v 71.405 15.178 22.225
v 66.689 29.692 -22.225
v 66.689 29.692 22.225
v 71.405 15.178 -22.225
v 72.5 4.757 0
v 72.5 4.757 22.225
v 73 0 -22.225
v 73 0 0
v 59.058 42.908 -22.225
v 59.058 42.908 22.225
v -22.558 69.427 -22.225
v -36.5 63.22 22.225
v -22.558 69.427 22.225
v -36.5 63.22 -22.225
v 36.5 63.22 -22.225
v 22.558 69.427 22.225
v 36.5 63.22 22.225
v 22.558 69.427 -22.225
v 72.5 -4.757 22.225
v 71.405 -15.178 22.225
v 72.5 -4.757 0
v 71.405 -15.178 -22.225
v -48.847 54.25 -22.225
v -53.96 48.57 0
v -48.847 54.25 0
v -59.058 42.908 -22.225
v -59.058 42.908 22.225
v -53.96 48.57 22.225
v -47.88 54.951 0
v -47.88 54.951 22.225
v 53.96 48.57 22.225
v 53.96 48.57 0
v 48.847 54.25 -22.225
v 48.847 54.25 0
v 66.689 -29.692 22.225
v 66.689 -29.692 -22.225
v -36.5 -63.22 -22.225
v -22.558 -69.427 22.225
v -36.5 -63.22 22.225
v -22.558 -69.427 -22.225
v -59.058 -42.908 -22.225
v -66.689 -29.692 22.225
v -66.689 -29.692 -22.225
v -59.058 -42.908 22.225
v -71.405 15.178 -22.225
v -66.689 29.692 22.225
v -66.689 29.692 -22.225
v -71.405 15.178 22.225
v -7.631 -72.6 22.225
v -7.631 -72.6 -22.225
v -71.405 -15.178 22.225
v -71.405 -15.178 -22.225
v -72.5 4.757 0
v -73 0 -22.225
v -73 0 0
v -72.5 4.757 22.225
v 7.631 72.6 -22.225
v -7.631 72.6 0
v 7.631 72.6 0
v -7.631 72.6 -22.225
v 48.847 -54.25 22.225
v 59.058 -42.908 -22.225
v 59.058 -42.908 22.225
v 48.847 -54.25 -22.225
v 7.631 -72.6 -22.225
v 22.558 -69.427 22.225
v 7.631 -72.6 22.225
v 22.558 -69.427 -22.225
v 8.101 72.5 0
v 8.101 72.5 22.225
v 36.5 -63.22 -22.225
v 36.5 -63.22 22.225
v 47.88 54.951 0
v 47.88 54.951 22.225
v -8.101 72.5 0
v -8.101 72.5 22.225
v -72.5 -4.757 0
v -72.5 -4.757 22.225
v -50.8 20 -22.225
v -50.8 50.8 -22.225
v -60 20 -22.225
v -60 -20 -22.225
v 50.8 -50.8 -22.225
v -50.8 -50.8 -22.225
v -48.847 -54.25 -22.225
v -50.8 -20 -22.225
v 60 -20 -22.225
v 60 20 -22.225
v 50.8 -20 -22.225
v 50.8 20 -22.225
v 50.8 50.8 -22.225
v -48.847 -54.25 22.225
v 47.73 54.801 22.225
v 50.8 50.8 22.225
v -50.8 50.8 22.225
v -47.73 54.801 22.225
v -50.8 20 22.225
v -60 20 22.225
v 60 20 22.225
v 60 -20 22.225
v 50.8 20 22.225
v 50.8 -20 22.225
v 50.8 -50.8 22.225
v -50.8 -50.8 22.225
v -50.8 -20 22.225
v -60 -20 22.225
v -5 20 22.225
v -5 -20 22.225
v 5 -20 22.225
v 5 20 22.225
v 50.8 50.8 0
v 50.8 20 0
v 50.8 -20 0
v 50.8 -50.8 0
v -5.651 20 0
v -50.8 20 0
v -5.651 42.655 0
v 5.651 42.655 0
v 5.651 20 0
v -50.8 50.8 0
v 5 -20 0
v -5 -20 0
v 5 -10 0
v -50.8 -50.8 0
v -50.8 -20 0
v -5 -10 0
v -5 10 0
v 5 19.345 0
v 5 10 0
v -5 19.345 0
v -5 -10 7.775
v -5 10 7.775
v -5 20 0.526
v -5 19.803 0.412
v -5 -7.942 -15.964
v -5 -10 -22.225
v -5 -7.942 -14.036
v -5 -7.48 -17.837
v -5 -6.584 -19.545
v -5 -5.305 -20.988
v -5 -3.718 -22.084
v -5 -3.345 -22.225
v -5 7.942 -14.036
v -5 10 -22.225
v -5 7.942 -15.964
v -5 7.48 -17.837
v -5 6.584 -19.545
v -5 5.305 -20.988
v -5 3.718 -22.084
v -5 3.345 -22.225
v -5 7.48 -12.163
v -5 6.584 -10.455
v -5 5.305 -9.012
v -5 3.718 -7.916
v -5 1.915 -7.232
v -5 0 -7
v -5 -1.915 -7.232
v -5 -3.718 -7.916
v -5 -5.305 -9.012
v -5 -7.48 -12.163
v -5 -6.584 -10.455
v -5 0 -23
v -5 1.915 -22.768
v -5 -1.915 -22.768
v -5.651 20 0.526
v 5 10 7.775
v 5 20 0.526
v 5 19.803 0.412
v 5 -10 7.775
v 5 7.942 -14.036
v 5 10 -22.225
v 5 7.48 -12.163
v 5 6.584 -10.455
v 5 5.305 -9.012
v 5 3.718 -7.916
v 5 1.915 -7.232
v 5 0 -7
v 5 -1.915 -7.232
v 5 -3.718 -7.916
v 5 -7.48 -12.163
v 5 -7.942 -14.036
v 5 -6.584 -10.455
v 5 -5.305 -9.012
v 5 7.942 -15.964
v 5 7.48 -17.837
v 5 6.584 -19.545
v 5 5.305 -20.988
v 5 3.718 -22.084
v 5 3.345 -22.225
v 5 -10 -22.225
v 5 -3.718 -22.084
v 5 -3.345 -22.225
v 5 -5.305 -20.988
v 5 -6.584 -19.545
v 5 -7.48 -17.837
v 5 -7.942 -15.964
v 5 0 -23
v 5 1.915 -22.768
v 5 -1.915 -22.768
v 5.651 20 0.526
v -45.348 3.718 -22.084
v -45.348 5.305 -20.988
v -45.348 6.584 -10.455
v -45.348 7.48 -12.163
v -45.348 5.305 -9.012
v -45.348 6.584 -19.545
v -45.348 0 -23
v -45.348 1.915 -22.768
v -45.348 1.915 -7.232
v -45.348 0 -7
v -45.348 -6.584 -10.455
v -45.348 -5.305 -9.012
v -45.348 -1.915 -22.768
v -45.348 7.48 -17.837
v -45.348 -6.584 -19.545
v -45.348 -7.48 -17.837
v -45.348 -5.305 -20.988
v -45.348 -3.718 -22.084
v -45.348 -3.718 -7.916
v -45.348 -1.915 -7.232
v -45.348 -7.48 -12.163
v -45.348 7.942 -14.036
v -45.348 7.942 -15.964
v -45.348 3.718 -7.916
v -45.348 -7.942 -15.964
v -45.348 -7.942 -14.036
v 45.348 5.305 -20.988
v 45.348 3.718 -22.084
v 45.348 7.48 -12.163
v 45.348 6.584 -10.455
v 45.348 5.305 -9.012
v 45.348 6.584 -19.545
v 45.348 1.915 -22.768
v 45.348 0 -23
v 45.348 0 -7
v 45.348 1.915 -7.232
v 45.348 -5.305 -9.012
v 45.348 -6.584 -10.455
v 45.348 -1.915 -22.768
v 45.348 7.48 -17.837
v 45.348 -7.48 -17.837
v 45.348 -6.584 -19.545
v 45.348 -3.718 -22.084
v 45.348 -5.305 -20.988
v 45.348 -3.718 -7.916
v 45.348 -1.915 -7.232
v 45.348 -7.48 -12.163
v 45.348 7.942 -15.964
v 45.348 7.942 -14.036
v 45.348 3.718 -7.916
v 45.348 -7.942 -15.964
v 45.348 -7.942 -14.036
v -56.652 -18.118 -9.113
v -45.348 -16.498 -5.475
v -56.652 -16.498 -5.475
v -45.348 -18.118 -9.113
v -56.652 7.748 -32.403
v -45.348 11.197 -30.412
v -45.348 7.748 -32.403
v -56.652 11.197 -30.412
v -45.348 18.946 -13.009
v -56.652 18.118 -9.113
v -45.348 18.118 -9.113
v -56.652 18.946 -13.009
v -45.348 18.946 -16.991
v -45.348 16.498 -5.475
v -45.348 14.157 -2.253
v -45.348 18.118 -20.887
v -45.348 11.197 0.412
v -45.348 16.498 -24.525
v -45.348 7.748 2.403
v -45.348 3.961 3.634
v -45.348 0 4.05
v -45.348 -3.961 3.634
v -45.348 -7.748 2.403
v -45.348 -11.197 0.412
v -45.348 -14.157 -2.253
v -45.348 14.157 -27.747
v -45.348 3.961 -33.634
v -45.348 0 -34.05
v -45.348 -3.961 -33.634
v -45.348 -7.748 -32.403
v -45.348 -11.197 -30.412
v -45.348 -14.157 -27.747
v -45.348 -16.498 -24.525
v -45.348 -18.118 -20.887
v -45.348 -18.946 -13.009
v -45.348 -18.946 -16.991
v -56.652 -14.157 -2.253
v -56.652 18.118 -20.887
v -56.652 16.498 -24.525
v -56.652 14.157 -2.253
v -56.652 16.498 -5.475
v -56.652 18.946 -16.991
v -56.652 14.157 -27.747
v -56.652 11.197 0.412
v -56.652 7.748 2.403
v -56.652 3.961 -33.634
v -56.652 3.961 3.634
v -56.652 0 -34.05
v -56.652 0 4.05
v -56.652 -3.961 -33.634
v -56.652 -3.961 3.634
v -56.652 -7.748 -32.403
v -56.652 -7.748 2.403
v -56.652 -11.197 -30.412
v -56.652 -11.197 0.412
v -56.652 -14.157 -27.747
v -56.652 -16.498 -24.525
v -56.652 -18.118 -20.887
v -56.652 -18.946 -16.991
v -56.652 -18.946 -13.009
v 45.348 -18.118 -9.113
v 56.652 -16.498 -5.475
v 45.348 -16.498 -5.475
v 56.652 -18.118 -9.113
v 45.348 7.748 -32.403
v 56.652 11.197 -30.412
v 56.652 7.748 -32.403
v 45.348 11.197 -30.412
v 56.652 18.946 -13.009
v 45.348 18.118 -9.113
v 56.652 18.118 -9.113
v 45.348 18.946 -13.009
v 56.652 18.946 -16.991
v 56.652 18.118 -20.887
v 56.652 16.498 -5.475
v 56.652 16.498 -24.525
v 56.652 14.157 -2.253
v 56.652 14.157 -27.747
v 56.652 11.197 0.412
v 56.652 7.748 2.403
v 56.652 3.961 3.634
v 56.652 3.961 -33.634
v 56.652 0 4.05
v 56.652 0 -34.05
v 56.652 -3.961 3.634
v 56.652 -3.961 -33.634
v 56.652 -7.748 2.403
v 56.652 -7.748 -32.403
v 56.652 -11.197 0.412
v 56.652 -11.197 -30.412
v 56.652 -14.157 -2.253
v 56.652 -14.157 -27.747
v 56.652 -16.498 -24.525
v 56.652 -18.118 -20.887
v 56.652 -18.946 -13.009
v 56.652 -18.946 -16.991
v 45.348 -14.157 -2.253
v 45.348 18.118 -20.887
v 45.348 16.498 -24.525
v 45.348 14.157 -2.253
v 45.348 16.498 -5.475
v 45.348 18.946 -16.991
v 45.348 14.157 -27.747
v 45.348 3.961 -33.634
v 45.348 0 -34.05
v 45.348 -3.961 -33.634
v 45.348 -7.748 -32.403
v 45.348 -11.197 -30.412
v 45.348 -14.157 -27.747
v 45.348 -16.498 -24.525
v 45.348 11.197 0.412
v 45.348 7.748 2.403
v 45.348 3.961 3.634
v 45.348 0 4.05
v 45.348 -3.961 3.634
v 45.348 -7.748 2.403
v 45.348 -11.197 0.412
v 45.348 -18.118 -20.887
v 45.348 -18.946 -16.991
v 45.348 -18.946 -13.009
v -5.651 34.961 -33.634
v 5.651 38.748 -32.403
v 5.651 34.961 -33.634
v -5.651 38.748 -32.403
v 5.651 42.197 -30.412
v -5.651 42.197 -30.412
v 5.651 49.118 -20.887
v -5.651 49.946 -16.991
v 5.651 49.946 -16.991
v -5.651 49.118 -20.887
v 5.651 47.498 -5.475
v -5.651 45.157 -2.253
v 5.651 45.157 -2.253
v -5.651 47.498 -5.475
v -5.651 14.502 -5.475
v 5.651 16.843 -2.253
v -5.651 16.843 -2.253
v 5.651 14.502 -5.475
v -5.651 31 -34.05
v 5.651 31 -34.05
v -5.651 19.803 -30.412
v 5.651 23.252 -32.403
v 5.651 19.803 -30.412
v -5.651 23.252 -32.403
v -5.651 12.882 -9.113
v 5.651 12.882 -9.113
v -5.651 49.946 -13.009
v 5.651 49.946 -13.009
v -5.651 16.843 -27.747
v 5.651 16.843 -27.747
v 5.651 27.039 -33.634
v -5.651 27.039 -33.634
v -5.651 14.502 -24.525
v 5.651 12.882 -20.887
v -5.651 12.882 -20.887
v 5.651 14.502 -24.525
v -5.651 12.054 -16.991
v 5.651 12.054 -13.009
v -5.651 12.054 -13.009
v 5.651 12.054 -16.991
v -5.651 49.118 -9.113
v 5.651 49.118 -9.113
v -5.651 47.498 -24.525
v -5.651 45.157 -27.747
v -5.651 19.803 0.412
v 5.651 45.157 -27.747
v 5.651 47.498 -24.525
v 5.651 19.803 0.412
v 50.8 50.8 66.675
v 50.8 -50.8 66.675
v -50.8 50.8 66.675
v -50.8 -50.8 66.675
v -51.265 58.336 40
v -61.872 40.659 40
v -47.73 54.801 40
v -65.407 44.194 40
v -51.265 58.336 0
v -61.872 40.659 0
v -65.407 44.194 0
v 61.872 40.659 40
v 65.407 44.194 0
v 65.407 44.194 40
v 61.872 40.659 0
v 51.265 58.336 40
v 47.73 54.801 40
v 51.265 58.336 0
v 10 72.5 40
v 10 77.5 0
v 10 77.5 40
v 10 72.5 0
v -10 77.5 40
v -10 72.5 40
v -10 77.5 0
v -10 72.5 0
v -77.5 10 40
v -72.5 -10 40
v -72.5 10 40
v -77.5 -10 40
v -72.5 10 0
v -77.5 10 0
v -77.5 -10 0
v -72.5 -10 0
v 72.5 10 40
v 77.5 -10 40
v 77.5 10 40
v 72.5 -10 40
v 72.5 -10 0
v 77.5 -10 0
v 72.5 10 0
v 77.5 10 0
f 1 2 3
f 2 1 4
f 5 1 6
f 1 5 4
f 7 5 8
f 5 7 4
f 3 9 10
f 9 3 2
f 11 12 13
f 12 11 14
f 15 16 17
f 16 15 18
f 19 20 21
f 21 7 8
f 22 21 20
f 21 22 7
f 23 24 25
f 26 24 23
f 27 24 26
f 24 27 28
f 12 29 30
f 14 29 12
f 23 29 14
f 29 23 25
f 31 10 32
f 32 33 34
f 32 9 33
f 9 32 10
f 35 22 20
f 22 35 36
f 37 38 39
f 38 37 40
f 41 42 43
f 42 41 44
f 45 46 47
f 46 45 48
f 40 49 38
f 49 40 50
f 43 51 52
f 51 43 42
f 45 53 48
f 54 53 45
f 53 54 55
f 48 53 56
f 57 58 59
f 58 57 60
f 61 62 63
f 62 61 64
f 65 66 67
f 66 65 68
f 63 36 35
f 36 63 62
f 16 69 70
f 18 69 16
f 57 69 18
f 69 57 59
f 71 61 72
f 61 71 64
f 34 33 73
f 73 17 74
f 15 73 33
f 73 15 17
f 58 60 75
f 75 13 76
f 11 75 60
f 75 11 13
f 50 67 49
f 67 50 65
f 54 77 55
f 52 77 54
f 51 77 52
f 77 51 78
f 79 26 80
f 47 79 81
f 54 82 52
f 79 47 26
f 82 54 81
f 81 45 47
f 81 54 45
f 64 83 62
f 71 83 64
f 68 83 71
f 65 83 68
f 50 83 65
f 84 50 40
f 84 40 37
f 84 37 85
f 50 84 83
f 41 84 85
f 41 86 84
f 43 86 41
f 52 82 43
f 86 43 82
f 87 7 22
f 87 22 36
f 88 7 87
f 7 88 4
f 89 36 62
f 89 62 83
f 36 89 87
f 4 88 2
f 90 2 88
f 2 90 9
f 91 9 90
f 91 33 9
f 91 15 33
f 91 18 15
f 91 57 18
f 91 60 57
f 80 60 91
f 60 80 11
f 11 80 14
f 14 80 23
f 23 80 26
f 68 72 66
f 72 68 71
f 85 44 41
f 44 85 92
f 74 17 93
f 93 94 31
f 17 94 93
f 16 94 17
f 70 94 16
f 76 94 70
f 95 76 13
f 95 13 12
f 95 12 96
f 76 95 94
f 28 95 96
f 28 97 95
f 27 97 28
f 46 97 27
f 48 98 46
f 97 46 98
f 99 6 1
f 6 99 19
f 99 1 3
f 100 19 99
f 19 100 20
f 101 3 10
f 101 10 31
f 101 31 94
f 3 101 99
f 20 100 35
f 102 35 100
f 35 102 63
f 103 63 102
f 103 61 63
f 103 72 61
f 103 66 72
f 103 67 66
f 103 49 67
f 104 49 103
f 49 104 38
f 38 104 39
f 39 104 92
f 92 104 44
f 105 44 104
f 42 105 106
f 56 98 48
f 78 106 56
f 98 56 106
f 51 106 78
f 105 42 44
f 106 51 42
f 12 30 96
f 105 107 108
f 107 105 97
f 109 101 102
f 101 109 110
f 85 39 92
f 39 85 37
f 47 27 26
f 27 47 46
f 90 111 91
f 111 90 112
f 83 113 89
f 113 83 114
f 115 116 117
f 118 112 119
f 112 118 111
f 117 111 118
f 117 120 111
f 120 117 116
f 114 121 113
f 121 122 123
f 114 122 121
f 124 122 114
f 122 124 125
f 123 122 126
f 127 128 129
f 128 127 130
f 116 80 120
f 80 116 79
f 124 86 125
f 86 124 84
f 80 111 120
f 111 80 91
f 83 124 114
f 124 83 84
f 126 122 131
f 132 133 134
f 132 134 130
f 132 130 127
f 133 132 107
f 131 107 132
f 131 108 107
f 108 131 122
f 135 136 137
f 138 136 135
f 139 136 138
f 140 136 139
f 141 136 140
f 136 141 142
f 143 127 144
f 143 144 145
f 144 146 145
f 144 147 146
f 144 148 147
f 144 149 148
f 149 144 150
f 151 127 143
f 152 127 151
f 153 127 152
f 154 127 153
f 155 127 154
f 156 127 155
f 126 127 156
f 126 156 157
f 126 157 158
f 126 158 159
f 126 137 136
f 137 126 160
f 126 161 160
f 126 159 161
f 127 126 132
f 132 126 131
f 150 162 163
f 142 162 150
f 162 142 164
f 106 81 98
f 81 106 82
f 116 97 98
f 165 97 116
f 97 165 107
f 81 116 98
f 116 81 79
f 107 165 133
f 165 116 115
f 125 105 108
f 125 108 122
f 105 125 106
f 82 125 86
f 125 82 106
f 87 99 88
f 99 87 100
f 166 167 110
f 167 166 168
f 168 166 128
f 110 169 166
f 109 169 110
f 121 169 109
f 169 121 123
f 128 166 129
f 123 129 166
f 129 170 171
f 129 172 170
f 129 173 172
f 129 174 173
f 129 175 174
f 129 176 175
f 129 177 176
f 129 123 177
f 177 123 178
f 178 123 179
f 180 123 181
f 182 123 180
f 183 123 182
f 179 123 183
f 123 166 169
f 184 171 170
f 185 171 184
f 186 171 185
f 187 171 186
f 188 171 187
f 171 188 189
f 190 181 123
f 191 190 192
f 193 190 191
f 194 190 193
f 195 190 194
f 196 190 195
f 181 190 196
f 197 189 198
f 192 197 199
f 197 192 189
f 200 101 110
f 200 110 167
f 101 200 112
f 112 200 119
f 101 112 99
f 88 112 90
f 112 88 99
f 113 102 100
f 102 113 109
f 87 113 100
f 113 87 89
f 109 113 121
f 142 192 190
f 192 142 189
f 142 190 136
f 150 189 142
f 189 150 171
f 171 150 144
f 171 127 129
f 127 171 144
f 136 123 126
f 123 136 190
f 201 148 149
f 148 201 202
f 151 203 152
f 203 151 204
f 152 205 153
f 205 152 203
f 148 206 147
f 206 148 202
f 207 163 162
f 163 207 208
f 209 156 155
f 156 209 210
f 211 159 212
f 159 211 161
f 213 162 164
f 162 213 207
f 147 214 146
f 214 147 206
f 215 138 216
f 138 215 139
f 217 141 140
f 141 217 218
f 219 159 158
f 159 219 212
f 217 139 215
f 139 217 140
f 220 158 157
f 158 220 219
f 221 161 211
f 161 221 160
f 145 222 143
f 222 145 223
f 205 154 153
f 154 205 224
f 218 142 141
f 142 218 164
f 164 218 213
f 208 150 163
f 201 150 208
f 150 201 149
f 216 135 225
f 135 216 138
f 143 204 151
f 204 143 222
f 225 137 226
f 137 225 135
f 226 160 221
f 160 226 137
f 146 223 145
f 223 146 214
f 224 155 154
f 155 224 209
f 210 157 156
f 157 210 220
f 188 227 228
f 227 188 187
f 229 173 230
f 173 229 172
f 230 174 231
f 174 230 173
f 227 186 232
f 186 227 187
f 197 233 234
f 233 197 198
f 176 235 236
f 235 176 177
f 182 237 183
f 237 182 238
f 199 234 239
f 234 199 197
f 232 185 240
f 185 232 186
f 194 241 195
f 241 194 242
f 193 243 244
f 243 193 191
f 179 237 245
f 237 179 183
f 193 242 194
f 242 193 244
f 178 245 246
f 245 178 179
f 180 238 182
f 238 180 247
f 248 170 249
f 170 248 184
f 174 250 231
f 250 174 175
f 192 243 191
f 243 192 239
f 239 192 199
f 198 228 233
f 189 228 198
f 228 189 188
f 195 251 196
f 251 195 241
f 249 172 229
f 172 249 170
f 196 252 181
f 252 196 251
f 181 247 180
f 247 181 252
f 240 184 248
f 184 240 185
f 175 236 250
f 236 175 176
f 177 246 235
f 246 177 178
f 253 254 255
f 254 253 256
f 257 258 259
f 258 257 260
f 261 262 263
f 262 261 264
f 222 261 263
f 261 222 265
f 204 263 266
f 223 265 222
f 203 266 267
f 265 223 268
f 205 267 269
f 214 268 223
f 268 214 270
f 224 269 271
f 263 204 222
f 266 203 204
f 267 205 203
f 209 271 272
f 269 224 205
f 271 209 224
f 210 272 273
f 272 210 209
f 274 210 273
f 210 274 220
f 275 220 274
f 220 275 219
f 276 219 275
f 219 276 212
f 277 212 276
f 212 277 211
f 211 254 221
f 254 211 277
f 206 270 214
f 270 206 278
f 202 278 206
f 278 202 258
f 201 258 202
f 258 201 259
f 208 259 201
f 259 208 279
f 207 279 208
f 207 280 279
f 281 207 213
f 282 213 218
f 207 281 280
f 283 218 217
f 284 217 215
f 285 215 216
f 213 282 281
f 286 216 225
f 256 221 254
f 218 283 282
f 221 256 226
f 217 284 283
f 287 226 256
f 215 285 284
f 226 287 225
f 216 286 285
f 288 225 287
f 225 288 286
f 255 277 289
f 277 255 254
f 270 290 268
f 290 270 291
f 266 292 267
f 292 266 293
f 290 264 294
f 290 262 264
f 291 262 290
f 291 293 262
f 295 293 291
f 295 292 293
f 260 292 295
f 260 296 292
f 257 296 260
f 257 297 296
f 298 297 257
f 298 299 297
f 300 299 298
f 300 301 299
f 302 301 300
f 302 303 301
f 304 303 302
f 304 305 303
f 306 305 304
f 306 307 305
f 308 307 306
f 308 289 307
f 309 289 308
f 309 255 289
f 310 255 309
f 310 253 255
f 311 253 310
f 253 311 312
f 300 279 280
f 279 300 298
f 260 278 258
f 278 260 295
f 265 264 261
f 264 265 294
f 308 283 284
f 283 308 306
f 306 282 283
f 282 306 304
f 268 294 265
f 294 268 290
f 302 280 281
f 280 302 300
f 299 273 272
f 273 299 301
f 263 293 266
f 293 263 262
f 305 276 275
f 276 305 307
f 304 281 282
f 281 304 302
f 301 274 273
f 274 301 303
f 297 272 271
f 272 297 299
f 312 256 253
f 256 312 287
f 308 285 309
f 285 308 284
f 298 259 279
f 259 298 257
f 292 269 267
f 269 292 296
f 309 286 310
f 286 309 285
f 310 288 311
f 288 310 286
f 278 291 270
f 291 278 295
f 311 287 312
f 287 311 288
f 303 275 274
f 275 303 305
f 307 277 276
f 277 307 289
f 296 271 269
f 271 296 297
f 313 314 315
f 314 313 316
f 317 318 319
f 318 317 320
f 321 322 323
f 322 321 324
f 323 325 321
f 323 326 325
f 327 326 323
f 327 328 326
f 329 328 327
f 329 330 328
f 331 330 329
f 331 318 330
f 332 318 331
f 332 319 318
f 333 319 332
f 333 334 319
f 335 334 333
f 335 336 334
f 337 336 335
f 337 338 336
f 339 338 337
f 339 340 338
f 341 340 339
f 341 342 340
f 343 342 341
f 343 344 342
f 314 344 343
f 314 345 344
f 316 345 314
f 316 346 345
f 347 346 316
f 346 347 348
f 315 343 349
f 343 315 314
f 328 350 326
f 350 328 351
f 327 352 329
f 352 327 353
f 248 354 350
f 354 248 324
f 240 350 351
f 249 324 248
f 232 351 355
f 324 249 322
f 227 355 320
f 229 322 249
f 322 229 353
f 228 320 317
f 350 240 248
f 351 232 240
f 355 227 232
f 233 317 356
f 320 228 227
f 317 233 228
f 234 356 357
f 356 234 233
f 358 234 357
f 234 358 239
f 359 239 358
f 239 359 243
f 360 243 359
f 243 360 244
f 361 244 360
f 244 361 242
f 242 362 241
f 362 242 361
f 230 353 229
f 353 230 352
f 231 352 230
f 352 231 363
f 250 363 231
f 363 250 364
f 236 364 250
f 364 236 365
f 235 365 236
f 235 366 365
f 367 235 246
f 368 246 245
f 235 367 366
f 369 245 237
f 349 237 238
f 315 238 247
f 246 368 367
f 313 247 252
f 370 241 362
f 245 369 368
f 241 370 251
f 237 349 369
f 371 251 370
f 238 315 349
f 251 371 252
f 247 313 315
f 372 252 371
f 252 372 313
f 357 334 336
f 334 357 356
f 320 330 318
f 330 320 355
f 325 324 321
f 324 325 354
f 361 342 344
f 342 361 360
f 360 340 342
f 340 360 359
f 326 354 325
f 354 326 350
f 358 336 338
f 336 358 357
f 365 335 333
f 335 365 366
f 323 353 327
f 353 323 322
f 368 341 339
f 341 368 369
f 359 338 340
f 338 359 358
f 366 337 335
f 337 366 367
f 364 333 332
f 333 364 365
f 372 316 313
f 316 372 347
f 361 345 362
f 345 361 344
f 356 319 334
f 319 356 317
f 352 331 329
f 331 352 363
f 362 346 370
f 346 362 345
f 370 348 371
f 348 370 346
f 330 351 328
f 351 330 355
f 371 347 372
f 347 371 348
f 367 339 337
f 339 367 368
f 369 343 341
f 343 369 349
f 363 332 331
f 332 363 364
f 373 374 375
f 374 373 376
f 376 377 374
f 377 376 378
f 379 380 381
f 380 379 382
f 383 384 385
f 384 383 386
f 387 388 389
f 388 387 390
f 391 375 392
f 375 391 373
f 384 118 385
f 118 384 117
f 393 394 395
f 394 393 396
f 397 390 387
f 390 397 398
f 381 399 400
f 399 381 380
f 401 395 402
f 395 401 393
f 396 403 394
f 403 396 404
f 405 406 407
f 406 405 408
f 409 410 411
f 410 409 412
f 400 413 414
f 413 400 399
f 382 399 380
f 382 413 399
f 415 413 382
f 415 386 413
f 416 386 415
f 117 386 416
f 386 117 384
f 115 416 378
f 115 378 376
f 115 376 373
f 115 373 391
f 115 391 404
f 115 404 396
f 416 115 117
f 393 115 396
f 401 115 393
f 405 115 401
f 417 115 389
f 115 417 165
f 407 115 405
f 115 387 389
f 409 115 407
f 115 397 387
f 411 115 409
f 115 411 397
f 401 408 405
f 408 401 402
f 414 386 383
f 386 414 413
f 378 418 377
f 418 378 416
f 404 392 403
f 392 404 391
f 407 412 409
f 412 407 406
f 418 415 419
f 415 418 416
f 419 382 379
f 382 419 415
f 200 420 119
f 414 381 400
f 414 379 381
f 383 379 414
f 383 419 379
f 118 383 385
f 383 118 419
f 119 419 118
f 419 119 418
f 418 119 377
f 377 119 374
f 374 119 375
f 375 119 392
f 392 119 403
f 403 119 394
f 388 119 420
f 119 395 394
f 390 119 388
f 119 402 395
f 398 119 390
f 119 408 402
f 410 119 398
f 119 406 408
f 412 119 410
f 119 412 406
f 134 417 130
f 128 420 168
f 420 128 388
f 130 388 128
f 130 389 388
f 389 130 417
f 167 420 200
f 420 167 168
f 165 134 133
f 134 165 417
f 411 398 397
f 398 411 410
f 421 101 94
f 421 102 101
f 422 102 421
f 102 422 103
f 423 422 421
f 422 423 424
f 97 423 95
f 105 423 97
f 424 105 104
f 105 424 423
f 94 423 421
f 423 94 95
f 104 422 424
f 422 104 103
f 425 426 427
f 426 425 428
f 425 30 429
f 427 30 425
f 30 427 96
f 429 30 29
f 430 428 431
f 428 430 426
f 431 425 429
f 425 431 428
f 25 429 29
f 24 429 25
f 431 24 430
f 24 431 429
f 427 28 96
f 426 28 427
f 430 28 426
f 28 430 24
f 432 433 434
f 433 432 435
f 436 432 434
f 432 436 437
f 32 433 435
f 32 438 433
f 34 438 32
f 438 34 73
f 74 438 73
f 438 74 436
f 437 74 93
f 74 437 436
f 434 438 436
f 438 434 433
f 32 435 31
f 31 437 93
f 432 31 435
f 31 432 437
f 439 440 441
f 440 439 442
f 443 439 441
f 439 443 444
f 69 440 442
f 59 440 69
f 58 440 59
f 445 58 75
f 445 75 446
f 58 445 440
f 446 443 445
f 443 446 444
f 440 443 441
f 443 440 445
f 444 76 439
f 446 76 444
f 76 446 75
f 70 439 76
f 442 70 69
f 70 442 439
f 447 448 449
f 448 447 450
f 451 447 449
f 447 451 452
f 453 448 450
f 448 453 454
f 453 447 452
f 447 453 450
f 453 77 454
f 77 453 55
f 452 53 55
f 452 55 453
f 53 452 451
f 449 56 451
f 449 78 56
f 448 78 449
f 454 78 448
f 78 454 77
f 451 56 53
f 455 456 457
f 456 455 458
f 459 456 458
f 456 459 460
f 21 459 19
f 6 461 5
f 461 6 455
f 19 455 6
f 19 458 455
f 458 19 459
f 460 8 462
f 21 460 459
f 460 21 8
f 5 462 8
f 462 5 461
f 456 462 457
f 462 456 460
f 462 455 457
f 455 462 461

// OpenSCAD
//main body
difference(){
    
    cylinder(44.45,73,73,true);
    // square hole in middle
    translate([0,0,-22.225])
        cube([101.6,101.6,44.45], true);
    //square extension L
    translate([-60, -20, -44.45])
    cube([55,40,88.9], false);
    //square extension R
    translate([5, -20, -44.45])
        cube([55,40,88.9], false);
    //another hole in the middle
    //cube([70,50,45], true);
    /*hole 1 in corner
    translate([-38, -38, 0])
        cylinder(500, 12, 12, true);
    //hole 2 in corner
    translate([-38, 38, 0])
        cylinder(500, 12, 12, true);
    //hole 3 in corner
    translate([38, -38, 0])
        cylinder(500, 12, 12, true);
    //hole 4 in corner
    translate([38, 38, 0])
        cylinder(500, 12, 12, true);*/
}
//center motor mounter
translate([-5, -10, -22.225])
    cube([10, 20, 30], false);
//main motor left
rotate([0,90,0])
    translate([15, 0, -25.45])
cylinder(40.9, 8, 8, true);
//main motor right
rotate([0,90,0])
    translate([15, 0, 25.45])
cylinder(40.9, 8, 8, true);
/*motor turnything left
rotate([90,0,0])
    translate([0,-75, -185]) 
    cylinder(40, 10, 10, $fn=6, true);
//motor turnything right
rotate([90,0,0])
    translate([0,-75, 185]) 
    cylinder(40, 10, 10, $fn=6, true);*/
//wheel left
rotate([0, 90, 0])
    translate([15, 0, -51])
    cylinder(11.303, 19.05, 19.05, true);
//wheel left
rotate([0, 90, 0])
    translate([15, 0, 51])
    cylinder(11.303, 19.05, 19.05, true);
//caster
rotate([0, 90, 0])
    translate([15, 31, 0])
    cylinder(11.303, 19.05, 19.05, true);
//controller
    translate([0,0,44.45])
        cube([101.6,101.6,44.45], true);
//ir sensor FL
rotate([0,0,45])
translate([-5, 75, 20])
    cube([20, 5, 40], true);
//ir sensor FR
rotate([0,0,-45])
translate([5, 75, 20])
    cube([20, 5, 40], true);
//ir sensor F
translate([0, 75, 20])
    cube([20, 5, 40], true);
//ir sensor L
rotate([0, 0, 90])
    translate([0, 75, 20])
        cube([20, 5, 40], true);
//ir sensor R
rotate([0, 0, 90])
    translate([0, -75, 20])
        cube([20, 5, 40], true);
